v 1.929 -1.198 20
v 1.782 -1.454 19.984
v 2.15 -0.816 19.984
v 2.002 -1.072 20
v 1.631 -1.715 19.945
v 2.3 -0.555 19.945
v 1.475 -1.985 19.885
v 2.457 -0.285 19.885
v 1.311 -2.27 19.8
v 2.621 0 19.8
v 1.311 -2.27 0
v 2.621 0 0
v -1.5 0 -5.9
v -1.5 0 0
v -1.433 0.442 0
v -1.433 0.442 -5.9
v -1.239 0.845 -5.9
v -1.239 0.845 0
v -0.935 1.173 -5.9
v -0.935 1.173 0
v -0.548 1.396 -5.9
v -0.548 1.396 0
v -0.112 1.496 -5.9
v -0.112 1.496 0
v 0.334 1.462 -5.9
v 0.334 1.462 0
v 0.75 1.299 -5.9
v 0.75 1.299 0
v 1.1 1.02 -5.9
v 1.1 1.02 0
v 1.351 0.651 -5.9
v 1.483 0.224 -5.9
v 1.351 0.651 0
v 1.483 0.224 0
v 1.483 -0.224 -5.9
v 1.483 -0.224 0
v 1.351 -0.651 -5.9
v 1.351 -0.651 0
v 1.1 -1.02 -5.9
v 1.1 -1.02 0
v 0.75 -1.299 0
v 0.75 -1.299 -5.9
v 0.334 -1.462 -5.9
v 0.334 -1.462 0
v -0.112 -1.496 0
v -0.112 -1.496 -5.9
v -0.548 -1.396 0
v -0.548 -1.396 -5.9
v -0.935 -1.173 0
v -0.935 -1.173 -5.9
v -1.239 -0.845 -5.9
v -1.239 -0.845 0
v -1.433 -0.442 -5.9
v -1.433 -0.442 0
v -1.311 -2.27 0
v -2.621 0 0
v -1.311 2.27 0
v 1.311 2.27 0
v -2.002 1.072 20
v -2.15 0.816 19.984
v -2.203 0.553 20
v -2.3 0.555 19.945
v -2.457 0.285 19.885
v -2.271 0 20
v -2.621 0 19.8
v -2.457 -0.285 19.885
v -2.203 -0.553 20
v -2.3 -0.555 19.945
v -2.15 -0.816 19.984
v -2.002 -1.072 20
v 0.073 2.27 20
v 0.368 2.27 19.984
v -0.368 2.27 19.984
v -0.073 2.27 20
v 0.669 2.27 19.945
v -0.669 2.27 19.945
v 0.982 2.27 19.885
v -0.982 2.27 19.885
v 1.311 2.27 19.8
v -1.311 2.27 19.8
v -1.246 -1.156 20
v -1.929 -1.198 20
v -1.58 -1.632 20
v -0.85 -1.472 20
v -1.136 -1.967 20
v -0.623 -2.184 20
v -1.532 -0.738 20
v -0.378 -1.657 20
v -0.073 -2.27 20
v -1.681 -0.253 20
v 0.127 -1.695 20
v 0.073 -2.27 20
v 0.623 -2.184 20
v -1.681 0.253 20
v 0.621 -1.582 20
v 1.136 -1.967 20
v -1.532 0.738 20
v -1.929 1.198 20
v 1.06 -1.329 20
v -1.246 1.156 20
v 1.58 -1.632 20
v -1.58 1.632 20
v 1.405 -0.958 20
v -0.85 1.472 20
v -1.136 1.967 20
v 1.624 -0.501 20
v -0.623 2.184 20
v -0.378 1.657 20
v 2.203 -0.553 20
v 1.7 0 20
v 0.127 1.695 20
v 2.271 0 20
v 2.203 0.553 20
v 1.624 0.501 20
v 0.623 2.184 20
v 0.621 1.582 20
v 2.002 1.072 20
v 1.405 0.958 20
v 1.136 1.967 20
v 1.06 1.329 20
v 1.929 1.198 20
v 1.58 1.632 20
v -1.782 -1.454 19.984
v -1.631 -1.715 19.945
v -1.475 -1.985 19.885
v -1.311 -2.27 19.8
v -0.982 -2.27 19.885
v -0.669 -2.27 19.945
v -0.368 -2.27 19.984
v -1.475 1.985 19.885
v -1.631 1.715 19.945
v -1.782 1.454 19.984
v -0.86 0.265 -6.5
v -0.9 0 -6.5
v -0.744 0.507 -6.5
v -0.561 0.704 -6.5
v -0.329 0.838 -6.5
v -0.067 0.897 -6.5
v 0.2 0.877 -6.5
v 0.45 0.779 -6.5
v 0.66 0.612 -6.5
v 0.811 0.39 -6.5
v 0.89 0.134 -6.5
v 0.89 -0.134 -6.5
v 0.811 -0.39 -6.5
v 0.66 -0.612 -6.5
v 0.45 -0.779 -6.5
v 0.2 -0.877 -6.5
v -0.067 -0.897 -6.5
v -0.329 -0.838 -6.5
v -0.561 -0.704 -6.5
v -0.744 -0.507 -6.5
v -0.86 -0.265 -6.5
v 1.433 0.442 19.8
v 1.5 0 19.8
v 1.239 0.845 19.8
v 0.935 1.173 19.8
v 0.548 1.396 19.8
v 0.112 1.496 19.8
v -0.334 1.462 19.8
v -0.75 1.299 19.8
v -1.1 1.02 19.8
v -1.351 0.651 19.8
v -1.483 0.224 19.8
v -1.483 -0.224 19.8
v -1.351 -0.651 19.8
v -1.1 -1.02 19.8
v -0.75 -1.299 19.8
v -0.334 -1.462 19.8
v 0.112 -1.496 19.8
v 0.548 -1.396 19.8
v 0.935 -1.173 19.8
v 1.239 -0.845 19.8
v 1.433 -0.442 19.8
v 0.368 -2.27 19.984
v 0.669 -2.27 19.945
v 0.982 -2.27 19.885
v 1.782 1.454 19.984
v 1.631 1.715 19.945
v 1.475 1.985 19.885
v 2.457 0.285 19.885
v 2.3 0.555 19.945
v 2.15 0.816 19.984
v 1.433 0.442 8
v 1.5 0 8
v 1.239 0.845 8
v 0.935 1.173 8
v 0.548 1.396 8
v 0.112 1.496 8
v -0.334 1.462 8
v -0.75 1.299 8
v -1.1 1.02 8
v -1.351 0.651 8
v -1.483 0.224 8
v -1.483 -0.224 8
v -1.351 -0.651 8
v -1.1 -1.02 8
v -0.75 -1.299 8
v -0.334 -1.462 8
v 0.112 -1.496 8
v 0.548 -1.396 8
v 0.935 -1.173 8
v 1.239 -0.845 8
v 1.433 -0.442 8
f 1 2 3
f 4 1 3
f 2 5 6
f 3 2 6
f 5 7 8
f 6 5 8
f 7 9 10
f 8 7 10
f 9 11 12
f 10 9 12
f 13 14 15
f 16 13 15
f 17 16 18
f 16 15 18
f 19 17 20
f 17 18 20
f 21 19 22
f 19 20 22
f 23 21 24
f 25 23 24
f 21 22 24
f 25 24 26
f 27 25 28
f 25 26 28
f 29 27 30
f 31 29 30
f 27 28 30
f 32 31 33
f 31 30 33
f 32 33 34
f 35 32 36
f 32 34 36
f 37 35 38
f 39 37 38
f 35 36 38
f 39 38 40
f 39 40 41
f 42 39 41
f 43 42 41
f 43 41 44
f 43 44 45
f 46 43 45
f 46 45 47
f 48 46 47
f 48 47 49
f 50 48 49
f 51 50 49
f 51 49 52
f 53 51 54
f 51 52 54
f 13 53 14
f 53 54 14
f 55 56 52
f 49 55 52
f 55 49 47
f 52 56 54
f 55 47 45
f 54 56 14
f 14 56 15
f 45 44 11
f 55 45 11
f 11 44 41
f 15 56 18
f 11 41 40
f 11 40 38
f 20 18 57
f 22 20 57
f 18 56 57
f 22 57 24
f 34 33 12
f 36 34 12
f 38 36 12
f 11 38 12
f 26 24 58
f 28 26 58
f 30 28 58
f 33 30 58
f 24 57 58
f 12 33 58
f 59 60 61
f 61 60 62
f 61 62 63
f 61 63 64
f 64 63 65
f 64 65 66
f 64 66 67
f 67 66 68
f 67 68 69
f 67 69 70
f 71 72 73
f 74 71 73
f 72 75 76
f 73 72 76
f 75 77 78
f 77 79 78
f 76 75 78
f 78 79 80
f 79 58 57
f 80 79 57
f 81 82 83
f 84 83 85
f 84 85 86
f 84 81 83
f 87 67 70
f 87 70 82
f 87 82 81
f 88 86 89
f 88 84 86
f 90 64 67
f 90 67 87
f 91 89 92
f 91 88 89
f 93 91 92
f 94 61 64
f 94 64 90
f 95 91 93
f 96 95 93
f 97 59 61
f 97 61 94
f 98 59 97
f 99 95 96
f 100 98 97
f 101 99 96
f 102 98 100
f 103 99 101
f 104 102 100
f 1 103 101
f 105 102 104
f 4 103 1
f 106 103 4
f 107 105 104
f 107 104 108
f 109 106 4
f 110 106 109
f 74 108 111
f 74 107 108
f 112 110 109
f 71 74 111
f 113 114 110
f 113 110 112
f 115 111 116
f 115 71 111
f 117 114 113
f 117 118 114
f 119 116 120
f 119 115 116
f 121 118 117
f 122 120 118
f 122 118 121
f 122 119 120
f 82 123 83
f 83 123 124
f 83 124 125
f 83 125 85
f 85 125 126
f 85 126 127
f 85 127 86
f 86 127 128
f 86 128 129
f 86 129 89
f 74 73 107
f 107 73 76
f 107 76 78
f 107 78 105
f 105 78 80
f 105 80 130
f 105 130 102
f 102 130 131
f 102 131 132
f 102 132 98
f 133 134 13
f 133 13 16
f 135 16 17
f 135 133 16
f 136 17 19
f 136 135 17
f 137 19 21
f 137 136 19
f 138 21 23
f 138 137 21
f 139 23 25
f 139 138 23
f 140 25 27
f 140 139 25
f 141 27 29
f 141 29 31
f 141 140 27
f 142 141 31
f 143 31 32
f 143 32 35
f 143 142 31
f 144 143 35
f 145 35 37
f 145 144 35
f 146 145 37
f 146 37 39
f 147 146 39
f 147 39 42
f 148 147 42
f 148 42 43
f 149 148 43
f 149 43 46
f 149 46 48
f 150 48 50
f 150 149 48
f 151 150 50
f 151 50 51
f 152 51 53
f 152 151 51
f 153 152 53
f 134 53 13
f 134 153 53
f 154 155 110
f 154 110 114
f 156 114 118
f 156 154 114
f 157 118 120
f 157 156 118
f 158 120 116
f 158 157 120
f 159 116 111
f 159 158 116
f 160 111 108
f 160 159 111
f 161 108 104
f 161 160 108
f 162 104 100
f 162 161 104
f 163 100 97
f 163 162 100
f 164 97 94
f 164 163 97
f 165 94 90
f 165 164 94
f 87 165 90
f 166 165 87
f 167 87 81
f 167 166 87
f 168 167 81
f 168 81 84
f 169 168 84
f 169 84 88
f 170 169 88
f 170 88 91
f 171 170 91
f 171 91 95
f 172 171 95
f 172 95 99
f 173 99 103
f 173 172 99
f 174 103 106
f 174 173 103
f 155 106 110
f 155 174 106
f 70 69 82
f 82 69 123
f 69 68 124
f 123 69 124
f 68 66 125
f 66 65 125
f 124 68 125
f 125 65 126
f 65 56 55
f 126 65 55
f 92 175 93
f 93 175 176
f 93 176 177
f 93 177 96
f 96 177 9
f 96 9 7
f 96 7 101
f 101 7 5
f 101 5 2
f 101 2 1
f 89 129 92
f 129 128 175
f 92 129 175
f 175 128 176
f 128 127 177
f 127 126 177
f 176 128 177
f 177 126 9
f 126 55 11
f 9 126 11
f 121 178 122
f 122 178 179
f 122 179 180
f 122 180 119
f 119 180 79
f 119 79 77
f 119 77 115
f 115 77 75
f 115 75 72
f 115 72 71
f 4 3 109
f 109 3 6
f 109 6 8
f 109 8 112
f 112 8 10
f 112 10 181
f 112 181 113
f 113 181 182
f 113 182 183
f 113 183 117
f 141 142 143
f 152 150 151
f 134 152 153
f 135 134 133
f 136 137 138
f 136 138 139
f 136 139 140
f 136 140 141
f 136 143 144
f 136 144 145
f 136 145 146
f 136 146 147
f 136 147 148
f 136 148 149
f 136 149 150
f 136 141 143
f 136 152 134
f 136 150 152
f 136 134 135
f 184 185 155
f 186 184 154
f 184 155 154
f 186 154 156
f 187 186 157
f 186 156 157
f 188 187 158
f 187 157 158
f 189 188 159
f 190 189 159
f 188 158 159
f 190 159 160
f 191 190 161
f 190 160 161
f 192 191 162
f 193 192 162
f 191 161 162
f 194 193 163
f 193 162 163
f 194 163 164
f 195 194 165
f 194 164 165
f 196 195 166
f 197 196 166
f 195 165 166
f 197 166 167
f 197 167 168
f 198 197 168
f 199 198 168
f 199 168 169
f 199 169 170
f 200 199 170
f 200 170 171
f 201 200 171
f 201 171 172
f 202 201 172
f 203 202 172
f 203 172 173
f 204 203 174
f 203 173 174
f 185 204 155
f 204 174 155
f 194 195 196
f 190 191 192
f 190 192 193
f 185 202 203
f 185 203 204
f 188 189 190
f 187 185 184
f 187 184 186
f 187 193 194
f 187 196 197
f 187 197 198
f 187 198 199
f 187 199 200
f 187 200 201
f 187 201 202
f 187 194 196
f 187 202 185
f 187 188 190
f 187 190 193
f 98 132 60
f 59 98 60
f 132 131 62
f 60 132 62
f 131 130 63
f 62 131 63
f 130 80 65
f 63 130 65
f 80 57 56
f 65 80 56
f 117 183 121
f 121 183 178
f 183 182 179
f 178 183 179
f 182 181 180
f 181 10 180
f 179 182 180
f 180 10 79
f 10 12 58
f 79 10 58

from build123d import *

# Parameters (mm, degrees)
BOSS_EXTRUDE1_DEPTH     = 20
SKETCH2_R               = 1.5
CUT_EXTRUDE1_DEPTH      = 1
CUT_EXTRUDE1_DEPTH_BACK = 12
CHAMFER1_SIZE           = 0.2
SKETCH4_R               = 1.5
BOSS_EXTRUDE2_DEPTH     = 6.5
CHAMFER2_SIZE           = 0.6


with BuildPart() as part:
    # Sketch1 → Boss-Extrude1 (new body)
    with BuildSketch(Plane.XY):
        Polygon((2.621170222, 0), (1.310585111, 2.27), (-1.310585111, 2.27), (-2.621170222, 0), (-1.310585111, -2.27), (1.310585111, -2.27), align=None)
    extrude(amount=BOSS_EXTRUDE1_DEPTH)

    # Sketch2 → Cut-Extrude1 (cut, two sides)
    with BuildSketch(Plane.XY.offset(20)) as cut_extrude1_sk:
        Circle(SKETCH2_R)
    extrude(amount=CUT_EXTRUDE1_DEPTH, mode=Mode.SUBTRACT)
    extrude(cut_extrude1_sk.sketch, amount=-CUT_EXTRUDE1_DEPTH_BACK, mode=Mode.SUBTRACT)

    # Sketch3 → Cut-Revolve1 (revolve, cut)
    with BuildSketch(Plane(origin=(0, 0, 0), x_dir=(1, 0, 0), z_dir=(0, 1, 0))):
        Polygon((-2.621170222, -20), (-2.271170222, -20), (-2.621170222, -19.8), align=None)
    revolve(axis=Axis((0, 0, 8), (0, 0, 1)), mode=Mode.SUBTRACT)

    # Chamfer1
    chamfer1_edges = [part.edges().sort_by_distance(p)[0] for p in [
        (-1.5, 0, 20),
    ]]
    chamfer(chamfer1_edges, length=CHAMFER1_SIZE)

    # Sketch4 → Boss-Extrude2 (add)
    with BuildSketch(Plane(origin=(0, 0, 0), x_dir=(-1, 0, 0), z_dir=(0, 0, -1))):
        Circle(SKETCH4_R)
    extrude(amount=BOSS_EXTRUDE2_DEPTH)

    # Chamfer2
    chamfer2_edges = [part.edges().sort_by_distance(p)[0] for p in [
        (1.5, 0, -6.5),
    ]]
    chamfer(chamfer2_edges, length=CHAMFER2_SIZE)


solid = part.part
